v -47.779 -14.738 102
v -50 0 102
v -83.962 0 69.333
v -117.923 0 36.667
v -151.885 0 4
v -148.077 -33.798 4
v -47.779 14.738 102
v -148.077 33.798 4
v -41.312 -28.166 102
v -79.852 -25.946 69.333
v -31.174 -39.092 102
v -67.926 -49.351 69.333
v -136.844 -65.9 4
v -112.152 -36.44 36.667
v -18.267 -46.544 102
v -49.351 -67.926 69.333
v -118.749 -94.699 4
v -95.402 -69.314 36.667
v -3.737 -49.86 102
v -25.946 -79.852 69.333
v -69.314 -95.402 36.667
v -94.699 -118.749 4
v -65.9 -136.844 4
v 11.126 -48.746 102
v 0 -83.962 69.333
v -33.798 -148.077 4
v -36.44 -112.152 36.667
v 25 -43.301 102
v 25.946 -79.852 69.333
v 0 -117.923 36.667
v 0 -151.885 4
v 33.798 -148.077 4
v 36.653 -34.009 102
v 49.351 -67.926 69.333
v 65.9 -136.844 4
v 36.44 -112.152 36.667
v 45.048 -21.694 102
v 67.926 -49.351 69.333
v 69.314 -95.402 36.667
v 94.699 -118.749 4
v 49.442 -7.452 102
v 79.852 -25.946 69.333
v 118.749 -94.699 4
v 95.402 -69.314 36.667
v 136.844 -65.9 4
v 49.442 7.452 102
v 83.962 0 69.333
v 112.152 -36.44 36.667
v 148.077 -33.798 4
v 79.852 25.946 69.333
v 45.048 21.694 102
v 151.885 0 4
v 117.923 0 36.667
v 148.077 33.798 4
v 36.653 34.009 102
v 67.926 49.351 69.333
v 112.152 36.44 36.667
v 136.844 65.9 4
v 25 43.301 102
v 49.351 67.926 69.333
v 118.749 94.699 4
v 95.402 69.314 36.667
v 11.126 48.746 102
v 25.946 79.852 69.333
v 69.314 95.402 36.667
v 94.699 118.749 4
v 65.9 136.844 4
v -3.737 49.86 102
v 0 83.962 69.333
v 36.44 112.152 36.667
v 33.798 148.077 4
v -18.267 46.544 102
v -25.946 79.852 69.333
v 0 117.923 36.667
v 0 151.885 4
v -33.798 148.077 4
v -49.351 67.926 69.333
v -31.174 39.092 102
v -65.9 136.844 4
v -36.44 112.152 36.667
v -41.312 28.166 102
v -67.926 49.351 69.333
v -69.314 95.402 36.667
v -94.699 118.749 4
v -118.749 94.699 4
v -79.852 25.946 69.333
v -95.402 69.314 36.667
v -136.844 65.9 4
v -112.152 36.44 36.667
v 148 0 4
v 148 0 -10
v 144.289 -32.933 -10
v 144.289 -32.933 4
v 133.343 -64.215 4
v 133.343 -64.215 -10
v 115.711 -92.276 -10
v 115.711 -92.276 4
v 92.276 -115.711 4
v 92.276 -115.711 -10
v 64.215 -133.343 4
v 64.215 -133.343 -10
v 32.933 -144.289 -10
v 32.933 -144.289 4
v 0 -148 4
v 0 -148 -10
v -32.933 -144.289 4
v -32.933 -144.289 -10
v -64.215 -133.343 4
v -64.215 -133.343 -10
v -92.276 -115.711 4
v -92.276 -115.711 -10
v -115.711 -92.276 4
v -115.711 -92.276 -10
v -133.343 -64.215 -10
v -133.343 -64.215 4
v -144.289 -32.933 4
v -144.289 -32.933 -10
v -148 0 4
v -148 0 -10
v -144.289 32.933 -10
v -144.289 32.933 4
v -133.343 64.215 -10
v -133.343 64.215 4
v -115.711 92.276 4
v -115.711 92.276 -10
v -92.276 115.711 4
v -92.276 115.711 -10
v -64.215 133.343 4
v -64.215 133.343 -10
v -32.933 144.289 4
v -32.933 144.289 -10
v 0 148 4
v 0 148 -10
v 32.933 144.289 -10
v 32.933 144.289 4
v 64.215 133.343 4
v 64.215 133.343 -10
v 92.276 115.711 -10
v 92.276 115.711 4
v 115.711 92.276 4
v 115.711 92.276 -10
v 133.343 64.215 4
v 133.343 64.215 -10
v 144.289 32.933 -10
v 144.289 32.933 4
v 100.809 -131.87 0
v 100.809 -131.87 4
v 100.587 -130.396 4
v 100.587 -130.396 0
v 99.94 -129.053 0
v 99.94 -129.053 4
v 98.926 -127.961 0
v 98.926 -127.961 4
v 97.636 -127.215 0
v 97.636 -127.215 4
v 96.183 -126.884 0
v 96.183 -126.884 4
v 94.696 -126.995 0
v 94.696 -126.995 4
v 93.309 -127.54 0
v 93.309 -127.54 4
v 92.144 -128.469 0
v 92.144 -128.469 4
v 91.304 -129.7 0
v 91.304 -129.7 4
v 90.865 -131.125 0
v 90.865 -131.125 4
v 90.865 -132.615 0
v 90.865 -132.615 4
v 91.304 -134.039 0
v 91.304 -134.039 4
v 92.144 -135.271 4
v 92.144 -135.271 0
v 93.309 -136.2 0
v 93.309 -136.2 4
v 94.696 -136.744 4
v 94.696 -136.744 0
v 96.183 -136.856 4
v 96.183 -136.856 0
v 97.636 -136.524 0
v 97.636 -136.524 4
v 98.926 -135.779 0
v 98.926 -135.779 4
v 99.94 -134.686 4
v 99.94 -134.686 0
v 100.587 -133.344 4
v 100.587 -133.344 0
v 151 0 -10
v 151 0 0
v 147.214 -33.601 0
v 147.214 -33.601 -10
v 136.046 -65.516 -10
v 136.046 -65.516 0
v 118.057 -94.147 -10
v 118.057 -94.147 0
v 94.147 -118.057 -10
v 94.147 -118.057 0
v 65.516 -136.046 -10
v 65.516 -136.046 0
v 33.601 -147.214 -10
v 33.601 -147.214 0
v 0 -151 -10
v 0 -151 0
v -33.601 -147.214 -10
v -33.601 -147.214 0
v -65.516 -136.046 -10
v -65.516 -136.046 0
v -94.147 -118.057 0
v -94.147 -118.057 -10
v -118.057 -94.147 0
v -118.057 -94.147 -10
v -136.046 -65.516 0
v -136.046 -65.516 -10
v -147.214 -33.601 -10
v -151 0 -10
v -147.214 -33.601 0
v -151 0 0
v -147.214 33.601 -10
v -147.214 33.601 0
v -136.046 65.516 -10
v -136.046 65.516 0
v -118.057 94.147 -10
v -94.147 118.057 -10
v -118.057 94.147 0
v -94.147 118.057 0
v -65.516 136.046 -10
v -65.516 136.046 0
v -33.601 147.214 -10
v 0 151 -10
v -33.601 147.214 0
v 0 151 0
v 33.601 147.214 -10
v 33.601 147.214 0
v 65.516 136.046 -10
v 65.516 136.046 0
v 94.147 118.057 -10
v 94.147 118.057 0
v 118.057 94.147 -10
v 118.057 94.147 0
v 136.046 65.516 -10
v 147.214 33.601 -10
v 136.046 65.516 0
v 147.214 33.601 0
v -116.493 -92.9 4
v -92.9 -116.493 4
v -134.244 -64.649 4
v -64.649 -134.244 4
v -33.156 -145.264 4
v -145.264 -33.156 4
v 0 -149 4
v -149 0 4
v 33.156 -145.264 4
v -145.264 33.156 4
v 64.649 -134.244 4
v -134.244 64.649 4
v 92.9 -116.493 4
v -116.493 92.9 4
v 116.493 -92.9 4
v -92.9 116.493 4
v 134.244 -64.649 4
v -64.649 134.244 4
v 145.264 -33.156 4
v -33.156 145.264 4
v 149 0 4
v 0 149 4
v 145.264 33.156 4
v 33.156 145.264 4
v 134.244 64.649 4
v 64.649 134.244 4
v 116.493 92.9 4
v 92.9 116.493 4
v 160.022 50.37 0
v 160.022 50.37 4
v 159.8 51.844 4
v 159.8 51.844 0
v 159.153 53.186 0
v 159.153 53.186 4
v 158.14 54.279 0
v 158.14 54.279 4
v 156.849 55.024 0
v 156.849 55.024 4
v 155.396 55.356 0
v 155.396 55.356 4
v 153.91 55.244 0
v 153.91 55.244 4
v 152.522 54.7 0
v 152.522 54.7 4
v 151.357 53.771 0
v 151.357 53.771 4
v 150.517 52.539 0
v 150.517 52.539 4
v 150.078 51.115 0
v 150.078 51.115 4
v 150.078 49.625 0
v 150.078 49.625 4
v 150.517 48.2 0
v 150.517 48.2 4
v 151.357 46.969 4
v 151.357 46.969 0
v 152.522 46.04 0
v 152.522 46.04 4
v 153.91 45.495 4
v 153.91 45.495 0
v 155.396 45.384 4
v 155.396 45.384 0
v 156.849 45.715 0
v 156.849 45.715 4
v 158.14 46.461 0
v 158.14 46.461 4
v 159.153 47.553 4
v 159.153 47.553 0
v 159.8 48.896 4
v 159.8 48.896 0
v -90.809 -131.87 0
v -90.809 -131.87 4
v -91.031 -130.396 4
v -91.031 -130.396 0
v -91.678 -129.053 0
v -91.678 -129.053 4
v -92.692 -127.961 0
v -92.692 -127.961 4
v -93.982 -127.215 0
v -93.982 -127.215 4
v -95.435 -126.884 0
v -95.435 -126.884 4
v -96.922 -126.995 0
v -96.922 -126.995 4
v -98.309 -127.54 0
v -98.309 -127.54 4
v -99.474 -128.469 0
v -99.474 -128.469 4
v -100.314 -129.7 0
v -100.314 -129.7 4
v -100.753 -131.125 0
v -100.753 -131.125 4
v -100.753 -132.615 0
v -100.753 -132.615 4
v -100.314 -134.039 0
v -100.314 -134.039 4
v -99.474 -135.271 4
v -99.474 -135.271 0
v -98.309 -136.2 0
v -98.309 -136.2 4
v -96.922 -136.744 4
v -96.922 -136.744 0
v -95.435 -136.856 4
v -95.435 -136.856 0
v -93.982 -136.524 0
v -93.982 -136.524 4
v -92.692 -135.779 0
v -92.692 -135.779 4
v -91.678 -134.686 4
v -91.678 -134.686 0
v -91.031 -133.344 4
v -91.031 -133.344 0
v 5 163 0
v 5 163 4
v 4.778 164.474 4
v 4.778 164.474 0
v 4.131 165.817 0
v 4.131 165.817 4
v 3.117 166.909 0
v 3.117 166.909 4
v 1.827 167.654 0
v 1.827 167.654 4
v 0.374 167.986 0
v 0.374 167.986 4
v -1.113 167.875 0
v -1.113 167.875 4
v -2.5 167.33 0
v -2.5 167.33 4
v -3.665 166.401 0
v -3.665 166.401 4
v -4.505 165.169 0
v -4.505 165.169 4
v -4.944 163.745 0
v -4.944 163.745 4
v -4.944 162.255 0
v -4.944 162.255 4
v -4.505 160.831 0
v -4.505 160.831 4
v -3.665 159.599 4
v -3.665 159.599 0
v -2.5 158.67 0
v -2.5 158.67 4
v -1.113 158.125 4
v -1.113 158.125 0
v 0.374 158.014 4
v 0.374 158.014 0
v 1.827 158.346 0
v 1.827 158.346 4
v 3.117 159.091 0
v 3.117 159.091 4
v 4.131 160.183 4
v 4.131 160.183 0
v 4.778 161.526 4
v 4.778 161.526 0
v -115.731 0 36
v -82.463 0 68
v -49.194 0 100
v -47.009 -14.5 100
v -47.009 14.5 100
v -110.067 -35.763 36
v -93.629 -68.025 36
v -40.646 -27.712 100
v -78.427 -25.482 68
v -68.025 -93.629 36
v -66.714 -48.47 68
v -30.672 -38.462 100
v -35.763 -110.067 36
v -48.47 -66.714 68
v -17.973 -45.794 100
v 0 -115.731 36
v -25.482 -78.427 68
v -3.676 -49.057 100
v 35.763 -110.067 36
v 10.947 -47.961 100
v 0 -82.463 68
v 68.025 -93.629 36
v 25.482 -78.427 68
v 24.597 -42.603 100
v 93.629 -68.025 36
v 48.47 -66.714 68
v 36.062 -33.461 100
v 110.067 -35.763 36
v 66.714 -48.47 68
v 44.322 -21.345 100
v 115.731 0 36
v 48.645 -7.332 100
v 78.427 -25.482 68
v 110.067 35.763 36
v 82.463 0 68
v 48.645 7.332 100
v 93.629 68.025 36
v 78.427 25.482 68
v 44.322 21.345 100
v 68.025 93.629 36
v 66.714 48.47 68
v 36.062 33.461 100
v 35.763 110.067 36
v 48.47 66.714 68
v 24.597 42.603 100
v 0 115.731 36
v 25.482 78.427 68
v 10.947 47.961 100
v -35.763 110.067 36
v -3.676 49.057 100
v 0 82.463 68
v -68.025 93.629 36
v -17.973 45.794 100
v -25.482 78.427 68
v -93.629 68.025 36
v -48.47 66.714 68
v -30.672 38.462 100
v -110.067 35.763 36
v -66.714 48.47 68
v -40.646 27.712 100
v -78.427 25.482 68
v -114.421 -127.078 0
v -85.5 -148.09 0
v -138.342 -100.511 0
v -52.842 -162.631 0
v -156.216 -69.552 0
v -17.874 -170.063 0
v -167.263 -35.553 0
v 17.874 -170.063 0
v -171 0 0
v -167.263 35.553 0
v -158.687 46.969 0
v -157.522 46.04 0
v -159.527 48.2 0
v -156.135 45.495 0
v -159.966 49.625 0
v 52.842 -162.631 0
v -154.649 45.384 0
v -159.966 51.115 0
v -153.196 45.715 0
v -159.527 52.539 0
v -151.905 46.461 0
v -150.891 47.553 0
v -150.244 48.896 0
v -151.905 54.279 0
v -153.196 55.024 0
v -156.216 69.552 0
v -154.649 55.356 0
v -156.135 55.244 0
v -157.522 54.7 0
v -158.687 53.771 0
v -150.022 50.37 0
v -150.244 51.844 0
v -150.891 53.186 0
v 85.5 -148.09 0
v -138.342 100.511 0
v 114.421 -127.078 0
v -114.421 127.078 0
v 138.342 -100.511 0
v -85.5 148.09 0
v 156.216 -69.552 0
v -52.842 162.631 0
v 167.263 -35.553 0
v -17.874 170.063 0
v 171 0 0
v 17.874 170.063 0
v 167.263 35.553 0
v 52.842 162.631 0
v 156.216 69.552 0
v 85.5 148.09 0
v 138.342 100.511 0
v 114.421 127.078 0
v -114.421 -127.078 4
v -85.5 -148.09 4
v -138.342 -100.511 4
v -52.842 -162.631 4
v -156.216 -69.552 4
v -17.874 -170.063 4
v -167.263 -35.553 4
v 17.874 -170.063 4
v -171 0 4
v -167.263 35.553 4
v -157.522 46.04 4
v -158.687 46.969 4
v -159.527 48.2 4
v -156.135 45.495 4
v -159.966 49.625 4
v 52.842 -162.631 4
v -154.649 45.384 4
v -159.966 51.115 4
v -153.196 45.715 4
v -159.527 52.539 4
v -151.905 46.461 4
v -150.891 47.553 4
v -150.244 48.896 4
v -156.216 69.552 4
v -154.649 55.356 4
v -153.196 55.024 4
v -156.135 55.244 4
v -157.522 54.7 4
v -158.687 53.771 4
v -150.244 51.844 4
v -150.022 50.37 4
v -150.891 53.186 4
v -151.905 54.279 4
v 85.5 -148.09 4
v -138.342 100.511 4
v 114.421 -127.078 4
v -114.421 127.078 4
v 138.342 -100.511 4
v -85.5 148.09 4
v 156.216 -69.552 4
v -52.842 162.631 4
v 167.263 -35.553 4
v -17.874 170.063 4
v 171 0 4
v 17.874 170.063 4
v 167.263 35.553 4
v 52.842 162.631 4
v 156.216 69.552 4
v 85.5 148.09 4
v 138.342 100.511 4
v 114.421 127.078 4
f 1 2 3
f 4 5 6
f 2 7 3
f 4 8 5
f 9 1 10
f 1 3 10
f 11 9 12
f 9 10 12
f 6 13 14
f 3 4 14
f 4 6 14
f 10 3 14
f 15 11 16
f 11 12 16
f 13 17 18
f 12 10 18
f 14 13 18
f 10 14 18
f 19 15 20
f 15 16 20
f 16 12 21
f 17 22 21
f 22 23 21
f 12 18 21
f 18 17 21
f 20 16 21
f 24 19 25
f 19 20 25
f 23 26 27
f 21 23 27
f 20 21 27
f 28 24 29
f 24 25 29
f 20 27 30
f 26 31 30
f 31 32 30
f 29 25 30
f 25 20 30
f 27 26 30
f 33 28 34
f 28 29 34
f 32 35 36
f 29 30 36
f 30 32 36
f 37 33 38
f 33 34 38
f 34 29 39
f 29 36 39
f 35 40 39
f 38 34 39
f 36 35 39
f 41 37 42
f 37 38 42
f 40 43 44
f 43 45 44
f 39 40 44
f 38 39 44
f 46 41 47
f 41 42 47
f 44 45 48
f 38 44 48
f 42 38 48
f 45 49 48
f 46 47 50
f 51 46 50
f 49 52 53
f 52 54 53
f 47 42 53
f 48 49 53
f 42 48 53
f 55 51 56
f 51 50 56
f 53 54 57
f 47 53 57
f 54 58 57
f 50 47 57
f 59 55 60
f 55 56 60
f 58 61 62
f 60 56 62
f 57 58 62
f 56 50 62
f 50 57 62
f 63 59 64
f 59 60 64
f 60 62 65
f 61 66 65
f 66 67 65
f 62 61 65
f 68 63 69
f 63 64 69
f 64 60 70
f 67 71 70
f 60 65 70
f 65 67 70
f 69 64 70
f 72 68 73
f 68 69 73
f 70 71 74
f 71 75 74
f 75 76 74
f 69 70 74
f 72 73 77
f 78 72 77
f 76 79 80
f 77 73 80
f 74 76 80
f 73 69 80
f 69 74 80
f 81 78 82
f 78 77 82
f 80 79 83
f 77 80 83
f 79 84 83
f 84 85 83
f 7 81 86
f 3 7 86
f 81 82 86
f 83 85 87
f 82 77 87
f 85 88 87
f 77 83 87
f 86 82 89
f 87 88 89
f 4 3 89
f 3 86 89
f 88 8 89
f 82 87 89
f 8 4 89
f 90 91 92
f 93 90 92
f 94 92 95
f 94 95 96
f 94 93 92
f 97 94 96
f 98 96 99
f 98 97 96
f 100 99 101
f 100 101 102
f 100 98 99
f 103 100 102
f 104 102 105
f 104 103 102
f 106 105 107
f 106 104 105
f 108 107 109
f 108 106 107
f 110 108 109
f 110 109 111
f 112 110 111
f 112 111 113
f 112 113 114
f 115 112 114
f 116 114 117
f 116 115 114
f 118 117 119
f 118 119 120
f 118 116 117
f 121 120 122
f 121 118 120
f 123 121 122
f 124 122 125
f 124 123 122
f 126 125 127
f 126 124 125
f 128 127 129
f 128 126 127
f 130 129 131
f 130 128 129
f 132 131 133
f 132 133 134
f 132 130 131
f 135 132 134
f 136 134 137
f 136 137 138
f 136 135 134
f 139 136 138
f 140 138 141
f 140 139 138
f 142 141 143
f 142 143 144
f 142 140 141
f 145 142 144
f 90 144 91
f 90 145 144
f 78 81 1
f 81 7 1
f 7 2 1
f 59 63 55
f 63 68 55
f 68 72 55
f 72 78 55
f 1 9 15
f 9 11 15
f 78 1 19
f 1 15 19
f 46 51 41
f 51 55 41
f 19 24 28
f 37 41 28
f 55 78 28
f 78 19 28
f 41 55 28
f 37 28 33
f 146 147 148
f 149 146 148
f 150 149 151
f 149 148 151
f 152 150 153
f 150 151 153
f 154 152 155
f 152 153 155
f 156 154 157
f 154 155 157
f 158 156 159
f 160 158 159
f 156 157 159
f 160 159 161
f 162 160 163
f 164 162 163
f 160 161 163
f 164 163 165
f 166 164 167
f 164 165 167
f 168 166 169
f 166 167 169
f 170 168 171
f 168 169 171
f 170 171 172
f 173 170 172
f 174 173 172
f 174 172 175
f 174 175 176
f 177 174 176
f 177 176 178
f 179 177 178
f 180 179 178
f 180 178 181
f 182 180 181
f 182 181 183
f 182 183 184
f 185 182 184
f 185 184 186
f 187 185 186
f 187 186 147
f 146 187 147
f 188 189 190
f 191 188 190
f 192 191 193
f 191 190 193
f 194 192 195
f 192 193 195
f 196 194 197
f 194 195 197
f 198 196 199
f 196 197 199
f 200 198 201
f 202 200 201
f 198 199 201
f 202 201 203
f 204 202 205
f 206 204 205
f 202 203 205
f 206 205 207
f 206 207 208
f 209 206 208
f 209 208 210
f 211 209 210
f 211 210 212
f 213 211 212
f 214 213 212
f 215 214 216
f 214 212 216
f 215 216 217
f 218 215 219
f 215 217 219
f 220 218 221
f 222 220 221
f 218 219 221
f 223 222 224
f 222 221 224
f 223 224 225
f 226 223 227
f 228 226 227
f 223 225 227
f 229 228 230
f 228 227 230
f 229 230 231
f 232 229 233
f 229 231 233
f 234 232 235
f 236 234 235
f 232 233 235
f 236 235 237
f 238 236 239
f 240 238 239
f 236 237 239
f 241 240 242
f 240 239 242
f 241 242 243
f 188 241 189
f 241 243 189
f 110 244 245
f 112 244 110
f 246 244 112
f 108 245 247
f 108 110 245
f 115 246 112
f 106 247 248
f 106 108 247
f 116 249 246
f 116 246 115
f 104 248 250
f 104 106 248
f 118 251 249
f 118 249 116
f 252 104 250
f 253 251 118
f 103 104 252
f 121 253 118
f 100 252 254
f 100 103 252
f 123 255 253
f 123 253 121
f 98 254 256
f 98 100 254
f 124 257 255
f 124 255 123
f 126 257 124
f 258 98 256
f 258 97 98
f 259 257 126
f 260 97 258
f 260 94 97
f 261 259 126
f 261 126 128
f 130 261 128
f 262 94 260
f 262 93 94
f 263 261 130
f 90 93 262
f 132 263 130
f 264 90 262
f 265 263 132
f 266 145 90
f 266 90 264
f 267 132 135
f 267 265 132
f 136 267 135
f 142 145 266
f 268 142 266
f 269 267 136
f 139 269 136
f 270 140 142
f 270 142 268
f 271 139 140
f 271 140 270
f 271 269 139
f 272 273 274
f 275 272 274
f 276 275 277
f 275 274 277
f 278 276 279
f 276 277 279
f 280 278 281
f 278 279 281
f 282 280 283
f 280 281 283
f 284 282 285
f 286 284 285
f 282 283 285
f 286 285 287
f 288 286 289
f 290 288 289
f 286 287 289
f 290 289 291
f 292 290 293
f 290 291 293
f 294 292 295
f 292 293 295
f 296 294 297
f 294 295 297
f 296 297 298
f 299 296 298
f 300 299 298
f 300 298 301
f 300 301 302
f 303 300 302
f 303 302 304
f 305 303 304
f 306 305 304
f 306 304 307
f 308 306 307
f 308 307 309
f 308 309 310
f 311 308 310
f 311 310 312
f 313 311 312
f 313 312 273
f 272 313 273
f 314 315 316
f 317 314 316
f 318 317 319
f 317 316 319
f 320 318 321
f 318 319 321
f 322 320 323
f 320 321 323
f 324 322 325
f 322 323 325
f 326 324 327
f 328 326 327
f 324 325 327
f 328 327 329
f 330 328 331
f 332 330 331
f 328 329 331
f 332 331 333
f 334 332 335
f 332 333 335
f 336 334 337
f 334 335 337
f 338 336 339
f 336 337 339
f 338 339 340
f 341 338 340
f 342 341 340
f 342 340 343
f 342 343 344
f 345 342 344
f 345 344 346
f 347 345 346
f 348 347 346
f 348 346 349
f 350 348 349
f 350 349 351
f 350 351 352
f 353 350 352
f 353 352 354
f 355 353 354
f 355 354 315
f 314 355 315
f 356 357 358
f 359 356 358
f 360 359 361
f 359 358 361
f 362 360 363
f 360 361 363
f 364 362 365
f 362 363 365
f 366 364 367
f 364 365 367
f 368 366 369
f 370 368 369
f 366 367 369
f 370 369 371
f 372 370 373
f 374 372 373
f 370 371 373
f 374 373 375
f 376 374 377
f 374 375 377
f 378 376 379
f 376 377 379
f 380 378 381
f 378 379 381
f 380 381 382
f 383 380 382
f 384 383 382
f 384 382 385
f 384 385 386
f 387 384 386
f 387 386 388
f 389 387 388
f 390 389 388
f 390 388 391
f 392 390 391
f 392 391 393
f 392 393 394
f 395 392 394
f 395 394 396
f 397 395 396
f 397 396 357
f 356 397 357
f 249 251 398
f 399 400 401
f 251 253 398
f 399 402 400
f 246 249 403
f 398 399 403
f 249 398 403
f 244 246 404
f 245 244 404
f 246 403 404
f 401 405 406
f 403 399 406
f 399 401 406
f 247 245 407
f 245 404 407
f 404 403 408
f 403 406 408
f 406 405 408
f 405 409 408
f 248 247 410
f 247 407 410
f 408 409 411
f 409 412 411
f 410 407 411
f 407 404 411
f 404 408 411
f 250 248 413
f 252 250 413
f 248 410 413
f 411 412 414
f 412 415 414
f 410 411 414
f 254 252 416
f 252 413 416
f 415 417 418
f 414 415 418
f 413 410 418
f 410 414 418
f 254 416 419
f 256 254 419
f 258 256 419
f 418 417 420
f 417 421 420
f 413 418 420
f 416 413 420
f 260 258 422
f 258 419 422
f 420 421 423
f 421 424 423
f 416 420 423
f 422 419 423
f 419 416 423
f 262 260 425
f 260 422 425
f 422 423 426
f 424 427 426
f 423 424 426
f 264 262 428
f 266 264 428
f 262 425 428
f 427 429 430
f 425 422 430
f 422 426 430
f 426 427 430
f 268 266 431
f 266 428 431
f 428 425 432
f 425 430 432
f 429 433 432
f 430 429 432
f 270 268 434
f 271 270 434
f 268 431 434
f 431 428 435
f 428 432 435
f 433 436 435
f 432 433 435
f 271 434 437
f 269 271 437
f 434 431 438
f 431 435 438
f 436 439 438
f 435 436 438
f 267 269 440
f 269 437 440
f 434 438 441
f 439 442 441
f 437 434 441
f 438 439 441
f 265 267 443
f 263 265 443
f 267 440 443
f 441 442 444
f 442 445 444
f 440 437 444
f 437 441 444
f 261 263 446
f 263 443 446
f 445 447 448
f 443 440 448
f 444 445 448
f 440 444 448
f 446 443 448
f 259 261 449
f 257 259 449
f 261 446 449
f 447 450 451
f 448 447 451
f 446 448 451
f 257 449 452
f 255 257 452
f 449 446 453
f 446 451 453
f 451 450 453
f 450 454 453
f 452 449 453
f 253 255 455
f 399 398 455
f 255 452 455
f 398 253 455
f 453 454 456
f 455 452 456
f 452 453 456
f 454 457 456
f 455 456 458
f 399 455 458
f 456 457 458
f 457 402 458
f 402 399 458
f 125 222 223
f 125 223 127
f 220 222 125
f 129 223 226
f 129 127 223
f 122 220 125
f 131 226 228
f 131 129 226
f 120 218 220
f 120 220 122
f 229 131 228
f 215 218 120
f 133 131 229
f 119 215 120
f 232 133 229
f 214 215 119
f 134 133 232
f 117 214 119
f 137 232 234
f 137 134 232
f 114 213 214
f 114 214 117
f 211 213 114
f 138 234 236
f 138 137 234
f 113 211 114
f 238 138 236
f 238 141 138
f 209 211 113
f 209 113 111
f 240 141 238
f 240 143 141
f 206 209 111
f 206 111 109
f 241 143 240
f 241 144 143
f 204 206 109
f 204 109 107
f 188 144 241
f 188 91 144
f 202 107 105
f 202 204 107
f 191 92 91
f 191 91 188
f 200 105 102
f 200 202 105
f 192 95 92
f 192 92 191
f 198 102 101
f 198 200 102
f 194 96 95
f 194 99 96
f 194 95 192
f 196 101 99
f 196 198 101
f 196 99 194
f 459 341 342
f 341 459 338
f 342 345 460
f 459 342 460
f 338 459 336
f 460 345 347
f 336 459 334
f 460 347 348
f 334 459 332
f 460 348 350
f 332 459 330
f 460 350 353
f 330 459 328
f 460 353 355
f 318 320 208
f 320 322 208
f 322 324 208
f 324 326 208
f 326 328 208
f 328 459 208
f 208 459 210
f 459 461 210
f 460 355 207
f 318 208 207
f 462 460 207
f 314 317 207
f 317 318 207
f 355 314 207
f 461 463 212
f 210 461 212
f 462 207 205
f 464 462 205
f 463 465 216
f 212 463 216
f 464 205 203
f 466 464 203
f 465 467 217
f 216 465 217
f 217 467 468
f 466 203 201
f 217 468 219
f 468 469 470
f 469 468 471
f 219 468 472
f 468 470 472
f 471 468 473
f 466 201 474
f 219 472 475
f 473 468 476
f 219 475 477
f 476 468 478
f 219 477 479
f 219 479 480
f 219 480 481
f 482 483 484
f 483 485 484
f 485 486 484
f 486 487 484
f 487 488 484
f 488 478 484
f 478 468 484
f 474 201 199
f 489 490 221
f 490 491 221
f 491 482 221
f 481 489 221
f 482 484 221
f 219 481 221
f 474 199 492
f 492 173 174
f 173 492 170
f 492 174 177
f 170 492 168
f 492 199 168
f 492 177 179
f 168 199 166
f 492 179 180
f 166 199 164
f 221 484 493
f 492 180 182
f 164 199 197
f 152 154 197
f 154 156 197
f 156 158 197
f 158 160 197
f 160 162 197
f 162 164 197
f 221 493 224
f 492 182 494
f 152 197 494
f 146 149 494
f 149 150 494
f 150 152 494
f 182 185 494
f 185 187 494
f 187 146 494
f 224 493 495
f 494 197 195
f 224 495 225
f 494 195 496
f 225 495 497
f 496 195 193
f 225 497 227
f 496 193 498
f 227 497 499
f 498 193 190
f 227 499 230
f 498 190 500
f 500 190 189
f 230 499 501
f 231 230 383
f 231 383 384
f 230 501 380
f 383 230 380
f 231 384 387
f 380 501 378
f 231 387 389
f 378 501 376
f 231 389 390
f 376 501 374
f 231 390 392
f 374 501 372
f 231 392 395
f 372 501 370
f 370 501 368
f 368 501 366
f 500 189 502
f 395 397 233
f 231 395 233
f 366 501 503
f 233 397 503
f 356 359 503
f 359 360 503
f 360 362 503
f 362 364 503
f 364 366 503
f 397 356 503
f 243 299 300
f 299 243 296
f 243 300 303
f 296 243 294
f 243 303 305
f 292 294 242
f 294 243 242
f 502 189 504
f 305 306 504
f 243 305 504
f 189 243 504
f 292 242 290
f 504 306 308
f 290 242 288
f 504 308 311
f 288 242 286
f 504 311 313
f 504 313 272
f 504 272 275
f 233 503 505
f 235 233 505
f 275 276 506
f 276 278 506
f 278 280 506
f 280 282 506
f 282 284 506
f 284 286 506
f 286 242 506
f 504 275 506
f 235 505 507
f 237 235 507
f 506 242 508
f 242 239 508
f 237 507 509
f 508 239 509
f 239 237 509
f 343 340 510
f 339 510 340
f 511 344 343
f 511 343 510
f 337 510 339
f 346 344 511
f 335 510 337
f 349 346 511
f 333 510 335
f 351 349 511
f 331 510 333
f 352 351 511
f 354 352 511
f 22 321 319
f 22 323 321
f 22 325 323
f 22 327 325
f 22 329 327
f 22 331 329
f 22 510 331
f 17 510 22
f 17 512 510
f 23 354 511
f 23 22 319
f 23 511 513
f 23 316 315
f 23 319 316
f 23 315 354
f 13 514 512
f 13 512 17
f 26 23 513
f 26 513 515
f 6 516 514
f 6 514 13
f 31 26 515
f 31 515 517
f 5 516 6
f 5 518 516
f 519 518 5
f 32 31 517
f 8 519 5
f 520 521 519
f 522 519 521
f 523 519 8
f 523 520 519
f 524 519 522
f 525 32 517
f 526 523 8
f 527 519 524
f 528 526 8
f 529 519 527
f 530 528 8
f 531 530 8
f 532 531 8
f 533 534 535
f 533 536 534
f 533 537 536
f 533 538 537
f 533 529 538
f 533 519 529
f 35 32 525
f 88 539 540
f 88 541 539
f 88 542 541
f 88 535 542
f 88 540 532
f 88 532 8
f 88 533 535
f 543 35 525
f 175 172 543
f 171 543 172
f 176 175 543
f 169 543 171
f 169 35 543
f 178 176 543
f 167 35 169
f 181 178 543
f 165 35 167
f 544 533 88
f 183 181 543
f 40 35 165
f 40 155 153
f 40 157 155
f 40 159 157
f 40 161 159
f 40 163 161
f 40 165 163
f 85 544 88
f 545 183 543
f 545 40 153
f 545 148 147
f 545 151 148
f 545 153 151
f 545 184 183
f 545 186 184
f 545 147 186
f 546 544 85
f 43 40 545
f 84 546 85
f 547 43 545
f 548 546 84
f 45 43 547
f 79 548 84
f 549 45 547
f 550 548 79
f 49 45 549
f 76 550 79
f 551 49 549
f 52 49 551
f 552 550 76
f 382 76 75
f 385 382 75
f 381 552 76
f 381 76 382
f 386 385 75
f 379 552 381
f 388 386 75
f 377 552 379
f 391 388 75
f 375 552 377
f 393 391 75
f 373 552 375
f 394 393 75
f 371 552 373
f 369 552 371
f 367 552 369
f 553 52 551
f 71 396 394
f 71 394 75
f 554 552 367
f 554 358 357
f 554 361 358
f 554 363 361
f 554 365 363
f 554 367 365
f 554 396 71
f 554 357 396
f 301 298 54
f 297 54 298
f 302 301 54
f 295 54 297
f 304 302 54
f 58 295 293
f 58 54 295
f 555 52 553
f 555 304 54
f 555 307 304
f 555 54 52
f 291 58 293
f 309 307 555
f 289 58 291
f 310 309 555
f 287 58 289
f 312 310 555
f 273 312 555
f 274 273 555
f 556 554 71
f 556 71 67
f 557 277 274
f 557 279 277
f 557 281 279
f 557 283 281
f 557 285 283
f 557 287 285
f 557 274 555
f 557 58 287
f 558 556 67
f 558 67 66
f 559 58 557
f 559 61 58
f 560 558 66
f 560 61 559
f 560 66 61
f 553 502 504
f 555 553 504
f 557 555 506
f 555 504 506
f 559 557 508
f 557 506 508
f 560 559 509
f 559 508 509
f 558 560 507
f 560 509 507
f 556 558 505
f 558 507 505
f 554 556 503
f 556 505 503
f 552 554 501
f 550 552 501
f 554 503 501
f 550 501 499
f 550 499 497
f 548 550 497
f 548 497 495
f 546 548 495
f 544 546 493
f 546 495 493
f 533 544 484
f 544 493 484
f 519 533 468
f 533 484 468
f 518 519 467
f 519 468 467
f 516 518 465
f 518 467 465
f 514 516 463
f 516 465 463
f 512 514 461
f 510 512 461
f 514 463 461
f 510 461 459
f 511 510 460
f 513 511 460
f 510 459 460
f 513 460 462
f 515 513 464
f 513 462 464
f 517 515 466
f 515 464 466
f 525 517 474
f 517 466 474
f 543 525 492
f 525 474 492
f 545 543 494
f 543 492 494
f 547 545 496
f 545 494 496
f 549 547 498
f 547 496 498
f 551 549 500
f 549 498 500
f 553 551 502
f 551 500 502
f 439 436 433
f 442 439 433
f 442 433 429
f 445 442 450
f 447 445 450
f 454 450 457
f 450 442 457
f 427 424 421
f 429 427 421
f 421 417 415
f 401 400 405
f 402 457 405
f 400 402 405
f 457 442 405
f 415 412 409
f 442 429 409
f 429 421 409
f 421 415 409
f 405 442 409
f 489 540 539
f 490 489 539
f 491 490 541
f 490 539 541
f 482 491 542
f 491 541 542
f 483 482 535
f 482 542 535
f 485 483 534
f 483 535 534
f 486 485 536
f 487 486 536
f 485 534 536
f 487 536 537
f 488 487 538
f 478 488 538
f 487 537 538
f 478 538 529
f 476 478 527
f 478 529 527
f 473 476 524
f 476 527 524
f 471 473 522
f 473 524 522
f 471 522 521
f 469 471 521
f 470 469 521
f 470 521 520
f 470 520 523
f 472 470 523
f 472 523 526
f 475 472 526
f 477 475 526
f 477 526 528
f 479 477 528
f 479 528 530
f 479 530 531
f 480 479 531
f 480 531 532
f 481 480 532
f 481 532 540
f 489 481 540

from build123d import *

# Parameters (mm, degrees)
F0_R     = 171
F0_R_2   = 148
F1_DEPTH = 4
F2_R     = 5
F3_DEPTH = 4.001
F4_R     = 151
F4_R_2   = 148
F5_DEPTH = 10


with BuildPart() as f1:
    # F0 (on Top) → F1 (new body)
    with BuildSketch(Plane.XY):
        Circle(F0_R)
        Circle(F0_R_2, mode=Mode.SUBTRACT)
    extrude(amount=F1_DEPTH)

    # F2 (on face) → F3 (cut, through all)
    with BuildSketch(Plane.XY.offset(4)):
        with Locations((0, 163)):
            Circle(F2_R)
        with Locations((-155.0222121561, 50.3697700831)):
            Circle(F2_R)
        with Locations((155.0222121561, 50.3697700831)):
            Circle(F2_R)
        with Locations((95.8089961237, -131.8697700831)):
            Circle(F2_R)
        with Locations((-95.8089961237, -131.8697700831)):
            Circle(F2_R)
    extrude(amount=-F3_DEPTH, mode=Mode.SUBTRACT)

    # F4 (on face) → F5 (join)
    with BuildSketch(Plane(origin=(0, 0, 0), x_dir=(1, 0, 0), z_dir=(0, 0, -1))):
        Circle(F4_R)
        Circle(F4_R_2, mode=Mode.SUBTRACT)
    extrude(amount=F5_DEPTH)

    # F7 (on offset) → F8 (revolve)
    with BuildSketch(Plane.XZ):
        Polygon((-50, 102), (-151.8850358972, 4), (-149, 4), (-49.1942505497, 100), (0, 100), (0, 102), align=None)
    revolve(axis=Axis((0, 0, 51), (0, 0, 1)))


solid = f1.part
